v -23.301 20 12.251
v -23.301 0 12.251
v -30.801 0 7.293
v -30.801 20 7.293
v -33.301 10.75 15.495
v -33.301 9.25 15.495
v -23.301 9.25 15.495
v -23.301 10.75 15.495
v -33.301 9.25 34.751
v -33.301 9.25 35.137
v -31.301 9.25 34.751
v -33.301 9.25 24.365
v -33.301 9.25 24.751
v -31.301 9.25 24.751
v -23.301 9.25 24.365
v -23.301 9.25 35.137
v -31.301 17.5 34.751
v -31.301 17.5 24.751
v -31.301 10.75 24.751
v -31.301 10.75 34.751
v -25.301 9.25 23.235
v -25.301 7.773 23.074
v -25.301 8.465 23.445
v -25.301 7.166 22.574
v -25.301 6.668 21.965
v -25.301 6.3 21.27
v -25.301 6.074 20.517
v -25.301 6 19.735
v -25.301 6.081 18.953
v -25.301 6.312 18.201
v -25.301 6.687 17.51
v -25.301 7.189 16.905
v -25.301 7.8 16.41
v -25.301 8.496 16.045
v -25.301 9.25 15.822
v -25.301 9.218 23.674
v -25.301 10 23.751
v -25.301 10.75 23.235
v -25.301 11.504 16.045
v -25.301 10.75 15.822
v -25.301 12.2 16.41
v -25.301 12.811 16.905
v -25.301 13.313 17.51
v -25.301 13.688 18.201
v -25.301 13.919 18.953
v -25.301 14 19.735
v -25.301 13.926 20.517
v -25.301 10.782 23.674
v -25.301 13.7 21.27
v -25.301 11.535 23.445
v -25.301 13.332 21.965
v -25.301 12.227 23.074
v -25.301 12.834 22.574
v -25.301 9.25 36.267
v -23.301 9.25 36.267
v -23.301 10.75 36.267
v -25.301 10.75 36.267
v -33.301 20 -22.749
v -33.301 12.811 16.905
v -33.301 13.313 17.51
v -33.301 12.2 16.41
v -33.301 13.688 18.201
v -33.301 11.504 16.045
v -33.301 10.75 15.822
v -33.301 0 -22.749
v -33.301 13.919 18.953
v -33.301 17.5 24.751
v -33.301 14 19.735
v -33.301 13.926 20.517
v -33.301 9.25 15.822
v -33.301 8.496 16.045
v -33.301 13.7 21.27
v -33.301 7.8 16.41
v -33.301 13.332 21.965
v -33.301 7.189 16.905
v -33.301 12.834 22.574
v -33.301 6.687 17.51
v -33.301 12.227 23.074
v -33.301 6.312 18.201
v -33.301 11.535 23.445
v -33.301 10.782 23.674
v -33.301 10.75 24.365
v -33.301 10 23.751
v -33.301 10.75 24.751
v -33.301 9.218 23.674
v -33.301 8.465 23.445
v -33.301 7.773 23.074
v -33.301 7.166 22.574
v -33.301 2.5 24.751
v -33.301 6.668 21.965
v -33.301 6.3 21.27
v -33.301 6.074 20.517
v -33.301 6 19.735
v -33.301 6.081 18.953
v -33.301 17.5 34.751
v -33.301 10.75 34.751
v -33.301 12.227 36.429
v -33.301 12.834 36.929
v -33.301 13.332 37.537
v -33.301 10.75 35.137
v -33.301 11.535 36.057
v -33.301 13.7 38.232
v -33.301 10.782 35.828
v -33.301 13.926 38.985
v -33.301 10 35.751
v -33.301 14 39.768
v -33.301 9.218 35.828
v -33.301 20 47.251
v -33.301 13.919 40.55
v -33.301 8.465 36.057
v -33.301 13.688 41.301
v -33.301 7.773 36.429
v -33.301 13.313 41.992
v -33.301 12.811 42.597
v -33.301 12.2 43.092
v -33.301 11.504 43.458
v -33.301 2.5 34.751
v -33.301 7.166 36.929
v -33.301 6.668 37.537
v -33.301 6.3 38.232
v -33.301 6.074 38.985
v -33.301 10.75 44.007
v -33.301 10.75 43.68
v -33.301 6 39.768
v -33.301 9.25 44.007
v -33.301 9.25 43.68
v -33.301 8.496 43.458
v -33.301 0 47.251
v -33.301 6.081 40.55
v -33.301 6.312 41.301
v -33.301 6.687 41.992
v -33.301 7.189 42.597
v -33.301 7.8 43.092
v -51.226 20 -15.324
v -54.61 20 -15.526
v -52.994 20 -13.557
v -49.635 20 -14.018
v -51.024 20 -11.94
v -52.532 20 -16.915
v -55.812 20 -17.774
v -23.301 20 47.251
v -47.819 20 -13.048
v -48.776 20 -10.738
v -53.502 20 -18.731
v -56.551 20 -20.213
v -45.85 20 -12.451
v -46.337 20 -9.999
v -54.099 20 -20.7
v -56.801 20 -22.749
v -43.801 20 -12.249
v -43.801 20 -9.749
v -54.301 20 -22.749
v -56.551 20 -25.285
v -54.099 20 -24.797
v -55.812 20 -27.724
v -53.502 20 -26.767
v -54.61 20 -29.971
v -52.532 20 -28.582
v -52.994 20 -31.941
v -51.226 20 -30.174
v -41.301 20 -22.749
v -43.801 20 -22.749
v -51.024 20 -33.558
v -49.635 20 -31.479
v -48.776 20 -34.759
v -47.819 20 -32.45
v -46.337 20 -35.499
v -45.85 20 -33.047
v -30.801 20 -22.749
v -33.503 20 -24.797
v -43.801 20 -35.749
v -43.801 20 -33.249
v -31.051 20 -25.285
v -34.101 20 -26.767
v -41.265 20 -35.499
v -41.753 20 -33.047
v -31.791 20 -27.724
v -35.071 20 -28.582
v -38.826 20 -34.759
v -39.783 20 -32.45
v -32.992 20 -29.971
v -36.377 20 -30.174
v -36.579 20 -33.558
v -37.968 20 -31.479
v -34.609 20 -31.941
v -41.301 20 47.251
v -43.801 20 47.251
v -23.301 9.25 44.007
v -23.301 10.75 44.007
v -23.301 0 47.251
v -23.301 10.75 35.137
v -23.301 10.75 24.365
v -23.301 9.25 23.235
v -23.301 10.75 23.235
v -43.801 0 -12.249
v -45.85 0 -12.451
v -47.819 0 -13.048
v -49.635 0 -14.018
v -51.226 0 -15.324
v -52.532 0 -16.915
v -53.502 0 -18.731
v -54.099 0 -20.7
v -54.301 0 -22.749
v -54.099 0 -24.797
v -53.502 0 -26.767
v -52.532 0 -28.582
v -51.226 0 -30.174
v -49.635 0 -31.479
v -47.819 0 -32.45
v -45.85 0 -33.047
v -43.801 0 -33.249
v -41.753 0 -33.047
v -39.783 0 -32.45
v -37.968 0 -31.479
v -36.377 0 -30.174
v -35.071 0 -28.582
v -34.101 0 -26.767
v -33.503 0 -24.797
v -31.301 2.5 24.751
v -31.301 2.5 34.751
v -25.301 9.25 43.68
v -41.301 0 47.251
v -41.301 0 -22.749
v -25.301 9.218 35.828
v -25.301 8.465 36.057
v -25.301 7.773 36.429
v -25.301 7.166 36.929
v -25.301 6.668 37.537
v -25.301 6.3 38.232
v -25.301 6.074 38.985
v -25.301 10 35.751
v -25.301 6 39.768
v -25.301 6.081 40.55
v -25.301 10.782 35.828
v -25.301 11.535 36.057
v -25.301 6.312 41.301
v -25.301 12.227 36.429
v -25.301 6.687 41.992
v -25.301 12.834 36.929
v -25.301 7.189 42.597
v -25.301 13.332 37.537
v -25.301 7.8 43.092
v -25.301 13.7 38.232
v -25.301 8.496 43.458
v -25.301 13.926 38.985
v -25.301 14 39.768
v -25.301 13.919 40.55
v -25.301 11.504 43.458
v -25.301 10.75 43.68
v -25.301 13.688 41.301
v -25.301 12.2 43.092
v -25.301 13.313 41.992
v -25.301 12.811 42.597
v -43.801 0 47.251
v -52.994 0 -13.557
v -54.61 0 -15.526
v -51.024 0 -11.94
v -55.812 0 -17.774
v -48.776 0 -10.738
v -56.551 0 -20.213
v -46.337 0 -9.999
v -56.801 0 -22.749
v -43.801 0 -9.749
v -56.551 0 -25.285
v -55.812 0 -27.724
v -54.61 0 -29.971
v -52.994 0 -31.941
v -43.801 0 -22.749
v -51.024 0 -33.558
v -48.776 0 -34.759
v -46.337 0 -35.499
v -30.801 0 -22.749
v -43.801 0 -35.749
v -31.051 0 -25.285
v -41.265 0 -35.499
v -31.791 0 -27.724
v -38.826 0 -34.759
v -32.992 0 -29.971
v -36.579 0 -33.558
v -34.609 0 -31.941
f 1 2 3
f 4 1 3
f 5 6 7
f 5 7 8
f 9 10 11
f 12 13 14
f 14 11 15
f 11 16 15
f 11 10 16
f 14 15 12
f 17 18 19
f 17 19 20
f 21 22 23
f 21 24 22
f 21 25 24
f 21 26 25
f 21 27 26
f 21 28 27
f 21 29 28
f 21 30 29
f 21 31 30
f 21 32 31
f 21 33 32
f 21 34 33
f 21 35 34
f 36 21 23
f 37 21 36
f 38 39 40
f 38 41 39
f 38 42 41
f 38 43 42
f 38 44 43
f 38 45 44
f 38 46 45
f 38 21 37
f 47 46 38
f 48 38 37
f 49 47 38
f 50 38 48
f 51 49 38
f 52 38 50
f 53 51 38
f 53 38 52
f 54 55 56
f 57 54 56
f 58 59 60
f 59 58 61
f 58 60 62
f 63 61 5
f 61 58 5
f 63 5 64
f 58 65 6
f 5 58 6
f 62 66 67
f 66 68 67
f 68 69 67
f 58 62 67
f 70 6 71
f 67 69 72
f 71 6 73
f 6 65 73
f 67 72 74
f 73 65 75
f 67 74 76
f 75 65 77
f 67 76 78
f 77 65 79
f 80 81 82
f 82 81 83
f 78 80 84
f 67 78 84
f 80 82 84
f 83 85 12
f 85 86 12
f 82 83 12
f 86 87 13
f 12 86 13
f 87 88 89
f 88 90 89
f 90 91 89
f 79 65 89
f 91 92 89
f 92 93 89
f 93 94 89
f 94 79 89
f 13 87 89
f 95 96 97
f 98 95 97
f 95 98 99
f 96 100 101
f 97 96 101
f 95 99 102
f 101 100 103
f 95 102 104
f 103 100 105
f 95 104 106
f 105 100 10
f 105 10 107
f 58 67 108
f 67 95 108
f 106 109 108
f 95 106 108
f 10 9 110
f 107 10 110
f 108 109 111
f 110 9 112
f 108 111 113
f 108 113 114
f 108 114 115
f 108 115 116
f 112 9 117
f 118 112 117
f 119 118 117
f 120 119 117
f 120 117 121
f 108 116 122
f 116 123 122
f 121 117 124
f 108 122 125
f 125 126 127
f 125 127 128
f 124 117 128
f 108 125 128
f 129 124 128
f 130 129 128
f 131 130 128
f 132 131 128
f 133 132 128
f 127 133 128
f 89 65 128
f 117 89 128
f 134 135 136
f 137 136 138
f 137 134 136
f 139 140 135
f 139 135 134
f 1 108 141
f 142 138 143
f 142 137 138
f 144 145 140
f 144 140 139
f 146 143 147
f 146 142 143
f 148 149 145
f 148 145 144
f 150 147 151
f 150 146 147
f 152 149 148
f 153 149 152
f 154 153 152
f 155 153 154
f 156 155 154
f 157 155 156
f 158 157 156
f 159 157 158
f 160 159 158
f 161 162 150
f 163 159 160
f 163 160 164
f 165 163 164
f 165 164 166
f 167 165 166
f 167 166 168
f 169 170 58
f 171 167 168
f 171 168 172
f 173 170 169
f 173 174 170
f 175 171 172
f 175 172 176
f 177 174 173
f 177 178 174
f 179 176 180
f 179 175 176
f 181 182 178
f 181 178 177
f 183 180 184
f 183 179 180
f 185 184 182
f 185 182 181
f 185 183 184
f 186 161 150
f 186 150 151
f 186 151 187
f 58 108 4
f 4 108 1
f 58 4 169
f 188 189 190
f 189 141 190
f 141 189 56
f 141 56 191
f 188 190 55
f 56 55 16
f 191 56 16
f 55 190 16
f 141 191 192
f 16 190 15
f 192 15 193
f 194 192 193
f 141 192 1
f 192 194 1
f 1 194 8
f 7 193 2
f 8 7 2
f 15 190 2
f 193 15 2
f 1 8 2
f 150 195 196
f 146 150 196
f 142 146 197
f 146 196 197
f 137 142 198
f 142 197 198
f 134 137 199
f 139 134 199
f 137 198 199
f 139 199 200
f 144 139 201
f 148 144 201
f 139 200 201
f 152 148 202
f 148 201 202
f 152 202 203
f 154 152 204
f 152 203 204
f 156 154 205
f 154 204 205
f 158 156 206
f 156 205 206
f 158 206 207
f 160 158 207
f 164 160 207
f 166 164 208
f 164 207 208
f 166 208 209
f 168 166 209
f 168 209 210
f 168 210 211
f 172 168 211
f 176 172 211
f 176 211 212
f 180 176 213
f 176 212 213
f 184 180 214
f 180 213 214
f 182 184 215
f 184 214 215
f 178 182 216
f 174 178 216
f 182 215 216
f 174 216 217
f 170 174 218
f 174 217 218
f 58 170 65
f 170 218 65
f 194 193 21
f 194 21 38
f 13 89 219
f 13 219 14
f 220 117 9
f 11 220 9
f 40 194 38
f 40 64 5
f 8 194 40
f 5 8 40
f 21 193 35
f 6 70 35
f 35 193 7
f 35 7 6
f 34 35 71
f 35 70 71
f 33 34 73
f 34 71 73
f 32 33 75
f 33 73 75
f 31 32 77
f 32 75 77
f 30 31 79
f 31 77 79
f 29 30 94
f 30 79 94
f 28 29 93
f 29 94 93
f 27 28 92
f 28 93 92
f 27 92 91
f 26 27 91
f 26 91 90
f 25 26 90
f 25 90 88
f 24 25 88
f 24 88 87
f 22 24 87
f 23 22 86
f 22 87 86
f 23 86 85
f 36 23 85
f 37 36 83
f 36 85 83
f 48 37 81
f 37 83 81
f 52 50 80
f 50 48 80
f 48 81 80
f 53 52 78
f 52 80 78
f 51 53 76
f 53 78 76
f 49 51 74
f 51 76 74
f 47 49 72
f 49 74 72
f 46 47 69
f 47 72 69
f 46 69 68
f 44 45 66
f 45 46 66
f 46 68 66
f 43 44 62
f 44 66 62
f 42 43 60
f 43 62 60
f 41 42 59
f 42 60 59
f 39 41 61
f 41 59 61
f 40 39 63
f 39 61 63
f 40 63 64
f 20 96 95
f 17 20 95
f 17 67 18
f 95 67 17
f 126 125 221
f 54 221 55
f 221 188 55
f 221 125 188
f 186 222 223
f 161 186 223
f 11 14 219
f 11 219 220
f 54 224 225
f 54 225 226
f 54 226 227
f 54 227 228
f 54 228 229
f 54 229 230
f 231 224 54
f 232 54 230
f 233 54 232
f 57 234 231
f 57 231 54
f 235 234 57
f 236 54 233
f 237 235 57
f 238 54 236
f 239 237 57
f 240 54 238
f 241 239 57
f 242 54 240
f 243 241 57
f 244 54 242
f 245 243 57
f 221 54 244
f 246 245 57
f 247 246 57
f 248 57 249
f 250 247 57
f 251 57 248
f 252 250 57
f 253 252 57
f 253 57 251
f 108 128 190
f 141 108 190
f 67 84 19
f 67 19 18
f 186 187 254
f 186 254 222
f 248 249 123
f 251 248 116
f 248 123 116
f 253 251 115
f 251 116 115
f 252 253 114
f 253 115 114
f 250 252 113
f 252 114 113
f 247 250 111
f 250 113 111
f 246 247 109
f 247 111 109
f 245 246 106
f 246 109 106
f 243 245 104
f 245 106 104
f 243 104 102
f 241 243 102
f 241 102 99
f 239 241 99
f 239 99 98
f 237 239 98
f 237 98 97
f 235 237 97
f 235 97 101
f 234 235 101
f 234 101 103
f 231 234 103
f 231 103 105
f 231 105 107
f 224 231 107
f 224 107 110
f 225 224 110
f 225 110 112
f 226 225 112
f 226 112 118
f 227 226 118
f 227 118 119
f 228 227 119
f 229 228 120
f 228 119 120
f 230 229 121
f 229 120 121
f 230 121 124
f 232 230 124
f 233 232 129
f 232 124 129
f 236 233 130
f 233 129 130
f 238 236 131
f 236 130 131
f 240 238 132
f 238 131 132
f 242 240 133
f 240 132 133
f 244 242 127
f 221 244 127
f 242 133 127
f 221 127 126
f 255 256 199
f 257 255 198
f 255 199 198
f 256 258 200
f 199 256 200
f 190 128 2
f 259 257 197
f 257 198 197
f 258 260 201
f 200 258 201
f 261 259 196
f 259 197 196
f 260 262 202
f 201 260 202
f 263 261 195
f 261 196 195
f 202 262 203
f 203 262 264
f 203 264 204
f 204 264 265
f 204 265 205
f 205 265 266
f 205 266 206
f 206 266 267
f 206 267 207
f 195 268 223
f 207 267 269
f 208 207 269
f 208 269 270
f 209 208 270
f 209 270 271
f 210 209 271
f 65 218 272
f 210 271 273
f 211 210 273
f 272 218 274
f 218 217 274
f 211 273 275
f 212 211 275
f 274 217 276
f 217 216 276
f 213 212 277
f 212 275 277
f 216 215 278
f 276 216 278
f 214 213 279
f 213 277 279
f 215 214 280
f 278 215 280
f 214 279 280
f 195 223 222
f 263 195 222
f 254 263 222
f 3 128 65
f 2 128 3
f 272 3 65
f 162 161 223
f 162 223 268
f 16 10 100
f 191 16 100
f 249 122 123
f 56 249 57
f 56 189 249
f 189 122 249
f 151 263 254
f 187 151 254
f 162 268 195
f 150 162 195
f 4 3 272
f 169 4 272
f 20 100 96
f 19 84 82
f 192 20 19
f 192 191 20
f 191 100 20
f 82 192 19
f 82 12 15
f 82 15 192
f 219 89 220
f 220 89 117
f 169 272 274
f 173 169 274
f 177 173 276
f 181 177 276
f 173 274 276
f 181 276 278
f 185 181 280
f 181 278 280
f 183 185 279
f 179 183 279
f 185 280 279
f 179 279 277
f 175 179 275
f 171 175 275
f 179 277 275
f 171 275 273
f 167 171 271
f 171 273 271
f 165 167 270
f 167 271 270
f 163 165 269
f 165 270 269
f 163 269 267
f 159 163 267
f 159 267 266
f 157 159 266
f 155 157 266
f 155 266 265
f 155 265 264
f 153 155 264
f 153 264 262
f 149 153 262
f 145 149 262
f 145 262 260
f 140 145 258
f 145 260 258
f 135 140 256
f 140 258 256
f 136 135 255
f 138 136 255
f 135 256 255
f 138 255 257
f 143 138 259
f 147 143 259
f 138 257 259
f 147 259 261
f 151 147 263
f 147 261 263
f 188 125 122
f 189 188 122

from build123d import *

# Parameters (mm, degrees)
BOSS_EXTRUDE1_DEPTH = 20
SKETCH2_R           = 4
CUT_EXTRUDE2_DEPTH  = 8
SKETCH3_W           = 7.740011002
SKETCH3_H           = 1.5
SKETCH3_W_2         = 10.772479775
CUT_EXTRUDE4_DEPTH  = 10
SKETCH4_W           = 10
SKETCH4_H           = 15
CUT_EXTRUDE5_DEPTH  = 2


with BuildPart() as part:
    # Sketch1 → Boss-Extrude1 (new body)
    with BuildSketch(Plane(origin=(0, 0, 0), x_dir=(1, 0, 0), z_dir=(0, 1, 0))):
        with BuildLine():
            Line((-30.801242739, -7.293137555), (-30.801242739, 22.748893216))
            ThreePointArc((-30.801242739, 22.748893216), (-52.993630348, 31.941283464), (-43.801242739, 9.748894762))
            Line((-43.801242739, 9.748894762), (-43.801242739, -47.251105238))
            Line((-43.801242739, -47.251105238), (-41.301242739, -47.251105238))
            Line((-41.301242739, -47.251105238), (-41.301242739, 22.748894762))
            Line((-41.301242739, 22.748894762), (-43.801242739, 22.748894762))
            Line((-43.801242739, 22.748894762), (-43.801242739, 12.248894762))
            ThreePointArc((-43.801242739, 12.248894762), (-51.225863395, 30.173516511), (-33.301242739, 22.748893216))
            Line((-33.301242739, 22.748893216), (-33.301242739, -47.251106784))
            Line((-33.301242739, -47.251106784), (-23.301242739, -47.251106784))
            Line((-23.301242739, -47.251106784), (-23.301242739, -12.251106784))
            Line((-23.301242739, -12.251106784), (-30.801242739, -7.293137555))
        make_face()
    extrude(amount=BOSS_EXTRUDE1_DEPTH)

    # Sketch2 → Cut-Extrude2 (cut)
    with BuildSketch(Plane.ZY.offset(33.301242739)):
        with Locations((19.751105238, 10)):
            Circle(SKETCH2_R)
        with Locations((39.751105238, 10)):
            Circle(SKETCH2_R)
    extrude(amount=-CUT_EXTRUDE2_DEPTH, mode=Mode.SUBTRACT)

    # Sketch3 → Cut-Extrude4 (cut)
    with BuildSketch(Plane(origin=(-23.301242739, 0, 0), x_dir=(0, 0, -1), z_dir=(1, 0, 0))):
        with Locations((-40.137346671, 10)):
            Rectangle(SKETCH3_W, SKETCH3_H)
        with Locations((-29.751106784, 10)):
            Rectangle(SKETCH3_W_2, SKETCH3_H)
        with Locations((-19.364866896, 10)):
            Rectangle(SKETCH3_W, SKETCH3_H)
    extrude(amount=-CUT_EXTRUDE4_DEPTH, mode=Mode.SUBTRACT)

    # Sketch4 → Cut-Extrude5 (cut)
    with BuildSketch(Plane.ZY.offset(33.301242739)):
        with Locations((29.751105238, 10)):
            Rectangle(SKETCH4_W, SKETCH4_H)
    extrude(amount=-CUT_EXTRUDE5_DEPTH, mode=Mode.SUBTRACT)


solid = part.part
